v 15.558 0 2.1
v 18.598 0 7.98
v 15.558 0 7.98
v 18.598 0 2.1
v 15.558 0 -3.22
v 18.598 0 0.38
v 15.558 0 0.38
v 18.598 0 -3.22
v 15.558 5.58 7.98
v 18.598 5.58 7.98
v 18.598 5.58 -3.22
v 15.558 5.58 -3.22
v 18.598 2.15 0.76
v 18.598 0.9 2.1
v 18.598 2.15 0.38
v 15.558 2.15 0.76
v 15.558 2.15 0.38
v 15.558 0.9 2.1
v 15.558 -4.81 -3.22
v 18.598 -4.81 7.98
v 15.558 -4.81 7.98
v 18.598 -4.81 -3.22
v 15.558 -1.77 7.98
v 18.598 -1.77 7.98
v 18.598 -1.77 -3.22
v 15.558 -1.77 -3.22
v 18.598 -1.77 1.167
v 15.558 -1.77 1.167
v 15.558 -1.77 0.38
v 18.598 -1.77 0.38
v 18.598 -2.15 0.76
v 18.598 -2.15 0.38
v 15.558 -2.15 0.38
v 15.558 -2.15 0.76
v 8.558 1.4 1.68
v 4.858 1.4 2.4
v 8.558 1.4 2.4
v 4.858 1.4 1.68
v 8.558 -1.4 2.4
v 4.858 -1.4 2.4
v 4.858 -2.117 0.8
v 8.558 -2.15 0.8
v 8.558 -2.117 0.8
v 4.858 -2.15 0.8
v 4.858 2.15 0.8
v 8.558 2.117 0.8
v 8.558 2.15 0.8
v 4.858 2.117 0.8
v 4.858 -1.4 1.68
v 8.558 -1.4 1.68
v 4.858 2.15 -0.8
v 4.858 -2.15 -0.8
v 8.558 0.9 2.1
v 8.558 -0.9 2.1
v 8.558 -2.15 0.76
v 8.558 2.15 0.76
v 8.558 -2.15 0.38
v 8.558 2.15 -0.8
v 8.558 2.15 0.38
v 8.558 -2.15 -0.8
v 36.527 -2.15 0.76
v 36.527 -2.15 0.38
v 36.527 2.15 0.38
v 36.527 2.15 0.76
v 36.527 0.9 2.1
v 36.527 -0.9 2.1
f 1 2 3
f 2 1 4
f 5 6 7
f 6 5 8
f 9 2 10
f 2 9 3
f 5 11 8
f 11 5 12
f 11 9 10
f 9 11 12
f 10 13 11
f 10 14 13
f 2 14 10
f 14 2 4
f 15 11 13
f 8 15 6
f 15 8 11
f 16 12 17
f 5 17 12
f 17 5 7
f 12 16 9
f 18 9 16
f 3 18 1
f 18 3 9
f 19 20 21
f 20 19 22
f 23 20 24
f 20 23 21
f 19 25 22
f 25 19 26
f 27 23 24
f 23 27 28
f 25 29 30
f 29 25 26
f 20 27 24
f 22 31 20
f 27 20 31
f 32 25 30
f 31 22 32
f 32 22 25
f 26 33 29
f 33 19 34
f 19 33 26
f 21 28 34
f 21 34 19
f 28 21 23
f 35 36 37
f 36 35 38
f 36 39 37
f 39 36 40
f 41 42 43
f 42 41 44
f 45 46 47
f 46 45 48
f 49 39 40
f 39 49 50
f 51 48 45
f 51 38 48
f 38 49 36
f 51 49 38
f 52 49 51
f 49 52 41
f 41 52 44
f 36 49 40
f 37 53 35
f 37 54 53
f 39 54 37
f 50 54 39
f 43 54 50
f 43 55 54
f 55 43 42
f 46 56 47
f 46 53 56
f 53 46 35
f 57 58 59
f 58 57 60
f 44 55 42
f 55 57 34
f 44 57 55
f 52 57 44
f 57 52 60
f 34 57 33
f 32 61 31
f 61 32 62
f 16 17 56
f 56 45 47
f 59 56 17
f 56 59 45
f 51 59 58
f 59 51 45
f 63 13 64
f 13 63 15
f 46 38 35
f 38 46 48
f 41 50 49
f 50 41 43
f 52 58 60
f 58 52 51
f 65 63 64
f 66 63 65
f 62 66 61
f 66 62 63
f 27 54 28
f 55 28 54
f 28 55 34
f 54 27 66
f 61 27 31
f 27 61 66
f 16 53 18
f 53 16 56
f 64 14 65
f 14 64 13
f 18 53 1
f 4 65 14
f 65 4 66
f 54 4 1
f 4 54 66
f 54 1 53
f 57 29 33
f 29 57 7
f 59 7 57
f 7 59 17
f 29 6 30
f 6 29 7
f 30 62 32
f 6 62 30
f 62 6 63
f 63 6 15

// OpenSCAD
// Peristaltic Pump Coupler
// Measured from https://www.adafruit.com/products/1150

render_part="pump_coupler";
render_part="pump_roller";
render_part="pump_roller_insert";
render_part="pump_roller_magnet_insert";
render_part="pump_hall_sensor";
//render_part="pump_shell_sensors";

function pump_coupler_id() = 4.38; // mm
function pump_coupler_od() = 22.37; // mm
function pump_base_th() = 1.93; // mm
function pump_base_hub_od() = 7.5; // mm
function pump_base_hub_th() = 2.45; // mm
function pump_peg_od() = 2.75; // mm
function pump_peg_h() = 10.22; // mm
function pump_peg_triangle_h() = 12.5; // mm

function pump_c2peg_r(peg_d=pump_peg_od(),triangle_h=pump_peg_triangle_h()) = 2*triangle_h/3-peg_d/2;

module pump_coupler(
    coupler_id=pump_coupler_id()
    , coupler_od=pump_coupler_od()
    , base_th=pump_base_th()
    , base_hub_od=pump_base_hub_od()
    , base_hub_th=pump_base_hub_th()
    , peg_od=pump_peg_od()
    , peg_h=pump_peg_h()
    , peg_triangle_h=pump_peg_triangle_h()
    ) {
    difference() {
        union() {
          translate([0,0,-base_hub_th]) cylinder(r=base_hub_od/2,h=base_hub_th,center=false,$fn=32);
          translate([0,0,-base_th]) cylinder(r=coupler_od/2,h=base_th,center=false,$fn=64);
          translate([pump_c2peg_r(peg_d=peg_od,triangle_h=peg_triangle_h),0,0]) cylinder(r=peg_od/2,h=peg_h,center=false,$fn=16);
          rotate([0,0,120]) translate([pump_c2peg_r(peg_d=peg_od,triangle_h=peg_triangle_h),0,0])
            cylinder(r=peg_od/2,h=peg_h,center=false,$fn=16);
          rotate([0,0,-120]) translate([pump_c2peg_r(peg_d=peg_od,triangle_h=peg_triangle_h),0,0])
            cylinder(r=peg_od/2,h=peg_h,center=false,$fn=16);
        }
        translate([0,0,-base_hub_th/2]) cylinder(r=coupler_id/2,h=2*base_hub_th,center=true,$fn=32);
    }
}
if(render_part=="pump_coupler") {
    pump_coupler();
}

function pump_roller_h() = 13.6; //mm - to measure
function pump_roller_od() = 11.08; // mm
function pump_roller_id() = pump_roller_od()-2*1.2; // mm
function pump_roller_id_depth() = 4.0; // mm

function pump_roller_peg_hole_id() = 2.75; // mm
function pump_roller_peg_hole_od() = 6.00; // mm
function pump_roller_peg_hole_depth() = 10.00; // mm
function pump_roller_cap_od() = 5.33; // mm
function pump_roller_cap_hole_id() = 9.00; // mm
function pump_roller_cap_depth() = 0.25; // mm
function pump_roller_cap_side_depth() = 6.38; // mm
function pump_roller_cap_wall_th() = 0.9; // mm

function m3_washer_od() = 6.86; // mm
function m3_washer_id() = 3.1; // mm
function m3_washer_th() = 0.6; // mm

module pump_roller( roller_h=pump_roller_h(), roller_od=pump_roller_od(), roller_id=pump_roller_id(), roller_id_depth=pump_roller_id_depth()
    , peg_hole_id=pump_roller_peg_hole_id(), peg_hole_od=pump_roller_peg_hole_od(), peg_hole_depth=pump_roller_peg_hole_depth()
    , cap_od=pump_roller_cap_od(), cap_hole_id=pump_roller_cap_hole_id(), cap_depth=pump_roller_cap_depth()
    , cap_side_depth=pump_roller_cap_side_depth(), cap_wall_th=pump_roller_cap_wall_th()
    ) {
    difference() {
        cylinder(r=roller_od/2,h=roller_h,center=false,$fn=360);
        cylinder(r=peg_hole_id/2,h=2*peg_hole_depth,center=true,$fn=32);
        difference() {
            cylinder(r=roller_id/2,h=2*roller_id_depth,center=true,$fn=32);
            cylinder(r=peg_hole_od/2,h=2*peg_hole_depth,center=true,$fn=32);
        }
        translate([0,0,roller_h]) {
            cylinder(r=cap_hole_id/2,h=2*cap_depth,center=true,$fn=32);
            difference() {
                cylinder(r=cap_hole_id/2,h=2*cap_side_depth,center=true,$fn=32);
                cylinder(r=cap_od/2,h=2*(cap_side_depth+cap_depth),center=true,$fn=32);
            }
        }
    }
}

if(render_part=="pump_roller") {
  echo("Rendering pump_roller()...");
  translate([0,-(pump_roller_od()+2.0),0]) pump_roller();
  pump_roller();
  translate([0,pump_roller_od()+2.0,0]) pump_roller();
}

module pump_roller_insert( roller_h=pump_roller_h(), roller_od=pump_roller_od()
    , peg_hole_id=pump_roller_peg_hole_id(), peg_hole_od=pump_roller_peg_hole_od(), peg_hole_depth=pump_roller_peg_hole_depth()
    , cap_od=pump_roller_cap_od(), cap_hole_id=pump_roller_cap_hole_id(), cap_depth=pump_roller_cap_depth()
    , cap_side_depth=pump_roller_cap_side_depth()/2, cap_wall_th=pump_roller_cap_wall_th()
    , center_hole_d=2.0, shrink_th=0.5, cut_w=0.4, cut_count=3
    , debug=false
    ) {
    if(debug) echo(str("  pump_roller_insert: od = ",cap_hole_id-shrink_th/2));
    if(debug) echo(str("  pump_roller_insert: id = ",cap_od+shrink_th/2));
    if(debug) echo(str("  pump_roller_insert: wall th = ",cap_hole_id-cap_od-shrink_th));
    difference() {
        hull() {
              cylinder(r2=cap_hole_id/2-shrink_th/4,r1=cap_hole_id/2-shrink_th/4-cap_depth,h=cap_depth,center=false,$fn=32);
            translate([0,0,cap_side_depth-2*cap_depth])
              cylinder(r1=cap_hole_id/2-shrink_th/4,r2=cap_hole_id/2-shrink_th/4-cap_depth,h=cap_depth,center=false,$fn=32);
        }
        translate([0,0,cap_side_depth-2*cap_depth])
          cylinder(r1=cap_od/2+shrink_th/4,r2=cap_od/2+shrink_th/4+2*cap_depth,h=2*cap_depth,center=false,$fn=32);
        if(center_hole_d>0) cylinder(r=center_hole_d/2,h=4*cap_depth,center=true,$fn=32);
        translate([0,0,cap_depth]) cylinder(r=cap_od/2+shrink_th/4,h=cap_side_depth,center=false,$fn=32);
        if(cut_count>0) for(i=[0:cut_count-1]) rotate([0,0,i*360/cut_count]) translate([0,-cut_w/2,2*cap_depth])
            cube([cap_hole_id/2,cut_w,cap_side_depth],center=false);
    }
}

if(render_part=="pump_roller_insert") {
    echo("Rendering pump_roller_insert()...");
    translate([0,-(pump_roller_cap_hole_id()+2.0),0]) pump_roller_insert(center_hole_d=0,cap_depth=2*pump_roller_cap_depth());
    pump_roller_insert(debug=true,center_hole_d=0,cap_depth=2*pump_roller_cap_depth());
    translate([0,pump_roller_cap_hole_id()+2.0,0]) pump_roller_insert(center_hole_d=0,cap_depth=2*pump_roller_cap_depth());
}

function magnet_od() = 1/4*25.4; // 1/4" diameter
function washer_od() = 6.8; // washer diameter
function magnet_h() = 1/10*25.4; // 1/10" height

module pump_roller_magnet_insert( roller_h=pump_roller_h(), roller_od=pump_roller_od()
    , peg_hole_id=pump_roller_peg_hole_id(), peg_hole_od=pump_roller_peg_hole_od(), peg_hole_depth=pump_roller_peg_hole_depth()
    , cap_od=pump_roller_cap_od(), cap_hole_id=pump_roller_cap_hole_id(), cap_depth=pump_roller_cap_depth()
    , cap_side_depth=pump_roller_cap_side_depth()/2, cap_wall_th=pump_roller_cap_wall_th()
    , center_hole_d=2.0, shrink_th=0.5, cut_w=0.4, cut_count=3
    , debug=false
    , magnet_od=washer_od(), magnet_h=magnet_h()
    ) {
    if(debug) echo(str("  pump_roller_insert: od = ",cap_hole_id-shrink_th/2));
    if(debug) echo(str("  pump_roller_insert: id = ",cap_od+shrink_th/2));
    if(debug) echo(str("  pump_roller_insert: wall th = ",cap_hole_id-cap_od-shrink_th));
    hole_d=(magnet_od>cap_od?magnet_od:cap_od)+shrink_th;
    hole_h=(magnet_h>cap_side_depth?magnet_h:cap_side_depth);
    if(debug) {
	if(magnet_h>cap_side_depth) {
		echo(str("    Using magnet_h: ",magnet_h));
		echo(str("    cap_side_depth:  ",cap_side_depth));
	} else {
		echo(str("    Using cap_side_depth:  ",cap_side_depth));
		echo(str("                magnet_h: ",magnet_h));
	}
    }
    difference() {
        hull() {
              cylinder(r2=cap_hole_id/2-shrink_th/4,r1=cap_hole_id/2-shrink_th/4-cap_depth,h=cap_depth,center=false,$fn=32);
            translate([0,0,(magnet_h>cap_side_depth?magnet_h:cap_side_depth)-cap_depth])
              cylinder(r1=cap_hole_id/2-shrink_th/4,r2=cap_hole_id/2-shrink_th/4-cap_depth,h=cap_depth,center=false,$fn=32);
        }
        translate([0,0,hole_h-0.5*cap_depth])
          cylinder(r1=hole_d/2,r2=hole_d/2+2*cap_depth,h=2*cap_depth,center=false,$fn=32);
        if(center_hole_d>0) cylinder(r=center_hole_d/2+shrink_th/2,h=4*cap_depth,center=true,$fn=32);
        translate([0,0,cap_depth]) cylinder(r=hole_d/2,h=hole_h,center=false,$fn=32);
        if(cut_count>0) for(i=[0:cut_count-1]) rotate([0,0,i*360/cut_count]) translate([0,-cut_w/2,2*cap_depth])
            cube([cap_hole_id/2,cut_w,hole_h],center=false);
    }
}

if(render_part=="pump_roller_magnet_insert") {
    echo("Rendering pump_roller_magnet_insert()...");
    translate([0,-(pump_roller_cap_hole_id()+2.0),0]) pump_roller_magnet_insert(center_hole_d=1/8*25.4,cap_depth=1.5*pump_roller_cap_depth());
    pump_roller_magnet_insert(debug=true,center_hole_d=1/8*25.4,cap_depth=1.5*pump_roller_cap_depth());
    translate([0,pump_roller_cap_hole_id()+2.0,0]) pump_roller_magnet_insert(center_hole_d=1/8*25.4,cap_depth=1.5*pump_roller_cap_depth());
}

function pump_shell_od() = 28.0; // 28.0mm
function pump_shell_h() = 2.8; // 2.8mm
function pump_shell_notch_w() = 7.0; // 7.0mm
function pump_shell_notch_h() = 4.5; // 4.5mm
function pump_shell_mount_inner() = 45.32;
function pump_shell_mount_outer() = 52.85;
function pump_shell_mount_bolt_d() = 3.0;
function shell_sensor_w() = 4.3;
// function shell_sensor_w_min() = 2.64;
function shell_sensor_w_min() = 2.8;
function shell_sensor_h() = 3.2;
function shell_sensor_th() = 1.6;
function shell_sensor_th_min() = 0.84;

module pump_hall_sensor(wall_th=1.6
	, shell_od=pump_shell_od(), shell_h=pump_shell_h()
	, peg_od=pump_peg_od()
	, peg_h=pump_peg_h()
	, peg_triangle_h=pump_peg_triangle_h()
	, sensor_w=shell_sensor_w(), sensor_w_min=shell_sensor_w_min(), sensor_h=shell_sensor_h()
	, sensor_th=shell_sensor_th(), sensor_th_min=shell_sensor_th_min()
	, shrink_th=0.5
	, wire_lead_spacing=0.05*25.4
	, connector_socket_w=0.1*25.4
	) {
	sensor_offset=pump_c2peg_r(peg_d=peg_od,triangle_h=peg_triangle_h);
			translate([0,shrink_th/2,sensor_th]) cube([sensor_w_min,sensor_h+shrink_th,sensor_th],center=true);
			hull() {
				translate([-sensor_w_min/2,-sensor_h/2,sensor_th_min]) cube([sensor_w_min,sensor_h+shrink_th,sensor_th_min],center=false);
				translate([-sensor_w/2,-sensor_h/2,0]) cube([sensor_w,sensor_h+shrink_th,sensor_th-sensor_th_min],center=false);
			}
			translate([0,shrink_th/2,0]) cube([sensor_w,sensor_h+shrink_th,sensor_th],center=true);
			rotate([0,0,180]) hull() {
				translate([-sensor_w/2,sensor_h/2-shrink_th/16,(sensor_th-sensor_th_min)/2]) cube([sensor_w,shell_od,(sensor_th-sensor_th_min)/2],center=false);
				translate([-sensor_w_min/2+shrink_th,sensor_h/2-shrink_th/16,sensor_th-sensor_th_min]) cube([sensor_w_min-2*shrink_th,shell_od,sensor_th_min+shrink_th],center=false);
			}
			rotate([0,0,180]) difference() {
				union() {
				// Socket for vdd and gnd plug
				translate([0,(shell_od/2)/2+wall_th,-1*shell_h]) translate([-2*connector_socket_w-shrink_th,0,-sensor_th_min/2]) cube([2*connector_socket_w+shrink_th,connector_socket_w+shrink_th,4*shell_h],center=false);
				// Socket for sig out plug
				translate([0,(shell_od/2)/2+wall_th,-1*shell_h]) translate([connector_socket_w/2+shrink_th,0,-sensor_th_min/2]) cube([connector_socket_w+shrink_th,connector_socket_w+shrink_th,4*shell_h],center=false);
				  if(false) hull() {
				    translate([0,(shell_od/2-sensor_offset)/2+wire_lead_spacing/2,0]) translate([-3*wire_lead_spacing/2,0,-sensor_th_min/2]) cube([3*wire_lead_spacing,2*wire_lead_spacing,1.5*sensor_th_min],center=false);
				    // vdd terminal
				    translate([0,(shell_od/2-sensor_offset)/2+1.5*wire_lead_spacing,0]) rotate([0,0,-90]) translate([-wire_lead_spacing/2,0,-sensor_th_min/2]) cube([1*wire_lead_spacing,3*wire_lead_spacing,1.5*sensor_th_min],center=false);
				    // sig out terminal
				    translate([0,(shell_od/2-sensor_offset)/2+1.5*wire_lead_spacing,0]) rotate([0,0,90]) translate([-wire_lead_spacing/2,0,-sensor_th_min/2]) cube([1*wire_lead_spacing,3*wire_lead_spacing,1.5*sensor_th_min],center=false);
				  }
				  // gnd terminal
				  //translate([0,shell_od/2-sensor_offset+shrink_th+wall_th,0]) translate([-1.5*wire_lead_spacing,0,-sensor_th_min/2]) cube([3*wire_lead_spacing,4*wire_lead_spacing,1.5*sensor_th_min],center=false);
				}
			}
}

if(render_part=="pump_hall_sensor") {
  echo("Rendering pump_hall_sensor()...");
  % pump_shell_sensors();
  translate([pump_c2peg_r(peg_d=pump_peg_od(),triangle_h=pump_peg_triangle_h()),0,0]) rotate([0,0,90]) pump_hall_sensor();
}

module pump_shell_sensors( wall_th=1.6
	, shell_od=pump_shell_od(), shell_h=pump_shell_h()
	, shell_notch_w=pump_shell_notch_w(), shell_notch_h=pump_shell_notch_h()
	, shell_mount_inner=pump_shell_mount_inner(), shell_mount_outer=pump_shell_mount_outer()
	, mount_bolt_hole_d=pump_shell_mount_bolt_d(), mount_bolt_head_h=3.0, mount_bolt_head_d=5.6,mount_bolt_hole_h=4.0
	, peg_od=pump_peg_od()
	, peg_h=pump_peg_h()
	, peg_triangle_h=pump_peg_triangle_h()
	, sensor_w=shell_sensor_w(), sensor_w_min=shell_sensor_w_min(), sensor_h=shell_sensor_h()
	, sensor_th=shell_sensor_th(), sensor_th_min=shell_sensor_th_min()
    , center_hole_d=2.0, shrink_th=0.5, sensor_count=6
	, wire_lead_spacing=0.05*25.4
	, connector_socket_w=0.1*25.4
	, anchor_nub_th=0.5
	) {
	sensor_offset=pump_c2peg_r(peg_d=peg_od,triangle_h=peg_triangle_h);
	difference() {
		union() {
		  hull() {
			cylinder(r1=shell_od/2+shrink_th+wall_th/2,r2=shell_od/2+wall_th+shrink_th,h=wall_th/2,center=false);
			translate([0,0,shell_h+sensor_th-wall_th/2]) cylinder(r1=shell_od/2+wall_th+shrink_th,r2=shell_od/2+shrink_th+wall_th/2,h=wall_th/2,center=false);
			translate([0,shell_mount_outer/2-mount_bolt_hole_d/2,0]) cylinder(r=mount_bolt_head_d/2+shrink_th+wall_th,h=mount_bolt_head_h,center=false,$fn=16);
			translate([0,shell_mount_outer/2-mount_bolt_hole_d/2,0]) cylinder(r=mount_bolt_hole_d/2+shrink_th+wall_th,h=mount_bolt_hole_h,center=false,$fn=16);
			translate([0,-(shell_mount_outer/2-mount_bolt_hole_d/2),0]) cylinder(r=mount_bolt_head_d/2+shrink_th+wall_th,h=mount_bolt_head_h,center=false,$fn=16);
			translate([0,-(shell_mount_outer/2-mount_bolt_hole_d/2),0]) cylinder(r=mount_bolt_hole_d/2+shrink_th+wall_th,h=mount_bolt_hole_h,center=false,$fn=16);
		  }
		  translate([shell_od/2+shrink_th,-shell_notch_w/2,0]) cube([wall_th,shell_notch_w,shell_notch_h+sensor_th],center=false);
		  hull() {
		    translate([0,shell_mount_inner/2+mount_bolt_hole_d/2,0]) cylinder(r=mount_bolt_hole_d/2+shrink_th+wall_th,h=mount_bolt_hole_h+wall_th,center=false,$fn=16);
		    translate([0,shell_mount_outer/2-mount_bolt_hole_d/2,0]) cylinder(r=mount_bolt_hole_d/2+shrink_th+wall_th,h=mount_bolt_hole_h+wall_th,center=false,$fn=16);
		  }
		  hull() {
		    translate([0,-(shell_mount_inner/2+mount_bolt_hole_d/2),0]) cylinder(r=mount_bolt_hole_d/2+shrink_th+wall_th,h=mount_bolt_hole_h+wall_th,center=false,$fn=16);
		    translate([0,-(shell_mount_outer/2-mount_bolt_hole_d/2),0]) cylinder(r=mount_bolt_hole_d/2+shrink_th+wall_th,h=mount_bolt_hole_h+wall_th,center=false,$fn=16);
		  }
		  for(i=[0:sensor_count-1]) rotate([0,0,360*(i+0.5*(sensor_count/2%2+1))/sensor_count]) translate([shell_od/2+shrink_th,-2*connector_socket_w-wall_th/2,0]) {
			cube([connector_socket_w+2*shrink_th+wall_th,4*connector_socket_w+2*shrink_th+wall_th,shell_h+sensor_th],center=false);
		  }

		}
		hull() {
		  translate([0,shell_mount_outer/2-mount_bolt_hole_d/2,0]) {
			cylinder(r=mount_bolt_head_d/2+shrink_th,h=mount_bolt_head_h,center=true,$fn=16);
			translate([0,0,mount_bolt_head_h]) cylinder(r1=mount_bolt_head_d/2+shrink_th,r2=0,h=mount_bolt_head_d/2+shrink_th,center=false,$fn=16);
		  }
		  translate([0,shell_mount_inner/2+mount_bolt_hole_d/2,0]) {
			cylinder(r=mount_bolt_head_d/2+shrink_th,h=mount_bolt_head_h,center=true,$fn=16);
			translate([0,0,mount_bolt_head_h]) cylinder(r1=mount_bolt_head_d/2+shrink_th,r2=0,h=mount_bolt_head_d/2+shrink_th,center=false,$fn=16);
		  }
		}
		hull() {
		  translate([0,shell_mount_outer/2-mount_bolt_hole_d/2,0]) cylinder(r=mount_bolt_hole_d/2+shrink_th,h=2*(mount_bolt_hole_h+2*wall_th),center=true,$fn=16);
		  translate([0,shell_mount_inner/2+mount_bolt_hole_d/2,0]) cylinder(r=mount_bolt_hole_d/2+shrink_th,h=2*(mount_bolt_hole_h+2*wall_th),center=true,$fn=16);
		}
		hull() {
		  translate(-[0,shell_mount_outer/2-mount_bolt_hole_d/2,0]) {
			cylinder(r=mount_bolt_head_d/2+shrink_th,h=mount_bolt_head_h,center=true,$fn=16);
			translate([0,0,mount_bolt_head_h]) cylinder(r1=mount_bolt_head_d/2+shrink_th,r2=0,h=mount_bolt_head_d/2+shrink_th,center=false,$fn=16);
		  }
		  translate(-[0,shell_mount_inner/2+mount_bolt_hole_d/2,0]) {
			cylinder(r=mount_bolt_head_d/2+shrink_th,h=mount_bolt_head_h,center=true,$fn=16);
			translate([0,0,mount_bolt_head_h]) cylinder(r1=mount_bolt_head_d/2+shrink_th,r2=0,h=mount_bolt_head_d/2+shrink_th,center=false,$fn=16);
		  }
		}
		hull() {
		  translate(-[0,shell_mount_outer/2-mount_bolt_hole_d/2,0]) cylinder(r=mount_bolt_hole_d/2+shrink_th,h=2*(mount_bolt_hole_h+2*wall_th),center=true,$fn=16);
		  translate(-[0,shell_mount_inner/2+mount_bolt_hole_d/2,0]) cylinder(r=mount_bolt_hole_d/2+shrink_th,h=2*(mount_bolt_hole_h+2*wall_th),center=true,$fn=16);
		}
		translate([0,0,sensor_th]) cylinder(r=shell_od/2+shrink_th,h=shell_h+sensor_th+sensor_h,center=false,$fn=128);
		for(i=[0:sensor_count-1]) rotate([0,0,360*(i+0.5*(sensor_count/2%2+1))/sensor_count]) translate([sensor_offset,0,0]) rotate([0,0,90]) {
			pump_hall_sensor(wall_th=wall_th
				, shell_od=shell_od, shell_h=shell_h
				, peg_od=peg_od
				, peg_h=peg_h
				, peg_triangle_h=peg_triangle_h
				, sensor_w=sensor_w, sensor_w_min=sensor_w_min, sensor_h=sensor_h
				, sensor_th=sensor_th, sensor_th_min=sensor_th_min
				, shrink_th=shrink_th
				, wire_lead_spacing=wire_lead_spacing
				, connector_socket_w=connector_socket_w
			);
		}	
	}
	for(i=[0:sensor_count-1]) rotate([0,0,360*(i+0.5*sensor_count/2%2)/sensor_count]) translate([shell_od/2+shrink_th,0,shell_h+sensor_th-anchor_nub_th/2]) {
		rotate([90,30,0]) cylinder(r=anchor_nub_th/2,h=10*anchor_nub_th,center=true,$fn=6);
	}
}

if(render_part=="pump_shell_sensors") {
  echo("Rendering pump_shell_sensors()...");
  pump_shell_sensors(sensor_count=6);
}
